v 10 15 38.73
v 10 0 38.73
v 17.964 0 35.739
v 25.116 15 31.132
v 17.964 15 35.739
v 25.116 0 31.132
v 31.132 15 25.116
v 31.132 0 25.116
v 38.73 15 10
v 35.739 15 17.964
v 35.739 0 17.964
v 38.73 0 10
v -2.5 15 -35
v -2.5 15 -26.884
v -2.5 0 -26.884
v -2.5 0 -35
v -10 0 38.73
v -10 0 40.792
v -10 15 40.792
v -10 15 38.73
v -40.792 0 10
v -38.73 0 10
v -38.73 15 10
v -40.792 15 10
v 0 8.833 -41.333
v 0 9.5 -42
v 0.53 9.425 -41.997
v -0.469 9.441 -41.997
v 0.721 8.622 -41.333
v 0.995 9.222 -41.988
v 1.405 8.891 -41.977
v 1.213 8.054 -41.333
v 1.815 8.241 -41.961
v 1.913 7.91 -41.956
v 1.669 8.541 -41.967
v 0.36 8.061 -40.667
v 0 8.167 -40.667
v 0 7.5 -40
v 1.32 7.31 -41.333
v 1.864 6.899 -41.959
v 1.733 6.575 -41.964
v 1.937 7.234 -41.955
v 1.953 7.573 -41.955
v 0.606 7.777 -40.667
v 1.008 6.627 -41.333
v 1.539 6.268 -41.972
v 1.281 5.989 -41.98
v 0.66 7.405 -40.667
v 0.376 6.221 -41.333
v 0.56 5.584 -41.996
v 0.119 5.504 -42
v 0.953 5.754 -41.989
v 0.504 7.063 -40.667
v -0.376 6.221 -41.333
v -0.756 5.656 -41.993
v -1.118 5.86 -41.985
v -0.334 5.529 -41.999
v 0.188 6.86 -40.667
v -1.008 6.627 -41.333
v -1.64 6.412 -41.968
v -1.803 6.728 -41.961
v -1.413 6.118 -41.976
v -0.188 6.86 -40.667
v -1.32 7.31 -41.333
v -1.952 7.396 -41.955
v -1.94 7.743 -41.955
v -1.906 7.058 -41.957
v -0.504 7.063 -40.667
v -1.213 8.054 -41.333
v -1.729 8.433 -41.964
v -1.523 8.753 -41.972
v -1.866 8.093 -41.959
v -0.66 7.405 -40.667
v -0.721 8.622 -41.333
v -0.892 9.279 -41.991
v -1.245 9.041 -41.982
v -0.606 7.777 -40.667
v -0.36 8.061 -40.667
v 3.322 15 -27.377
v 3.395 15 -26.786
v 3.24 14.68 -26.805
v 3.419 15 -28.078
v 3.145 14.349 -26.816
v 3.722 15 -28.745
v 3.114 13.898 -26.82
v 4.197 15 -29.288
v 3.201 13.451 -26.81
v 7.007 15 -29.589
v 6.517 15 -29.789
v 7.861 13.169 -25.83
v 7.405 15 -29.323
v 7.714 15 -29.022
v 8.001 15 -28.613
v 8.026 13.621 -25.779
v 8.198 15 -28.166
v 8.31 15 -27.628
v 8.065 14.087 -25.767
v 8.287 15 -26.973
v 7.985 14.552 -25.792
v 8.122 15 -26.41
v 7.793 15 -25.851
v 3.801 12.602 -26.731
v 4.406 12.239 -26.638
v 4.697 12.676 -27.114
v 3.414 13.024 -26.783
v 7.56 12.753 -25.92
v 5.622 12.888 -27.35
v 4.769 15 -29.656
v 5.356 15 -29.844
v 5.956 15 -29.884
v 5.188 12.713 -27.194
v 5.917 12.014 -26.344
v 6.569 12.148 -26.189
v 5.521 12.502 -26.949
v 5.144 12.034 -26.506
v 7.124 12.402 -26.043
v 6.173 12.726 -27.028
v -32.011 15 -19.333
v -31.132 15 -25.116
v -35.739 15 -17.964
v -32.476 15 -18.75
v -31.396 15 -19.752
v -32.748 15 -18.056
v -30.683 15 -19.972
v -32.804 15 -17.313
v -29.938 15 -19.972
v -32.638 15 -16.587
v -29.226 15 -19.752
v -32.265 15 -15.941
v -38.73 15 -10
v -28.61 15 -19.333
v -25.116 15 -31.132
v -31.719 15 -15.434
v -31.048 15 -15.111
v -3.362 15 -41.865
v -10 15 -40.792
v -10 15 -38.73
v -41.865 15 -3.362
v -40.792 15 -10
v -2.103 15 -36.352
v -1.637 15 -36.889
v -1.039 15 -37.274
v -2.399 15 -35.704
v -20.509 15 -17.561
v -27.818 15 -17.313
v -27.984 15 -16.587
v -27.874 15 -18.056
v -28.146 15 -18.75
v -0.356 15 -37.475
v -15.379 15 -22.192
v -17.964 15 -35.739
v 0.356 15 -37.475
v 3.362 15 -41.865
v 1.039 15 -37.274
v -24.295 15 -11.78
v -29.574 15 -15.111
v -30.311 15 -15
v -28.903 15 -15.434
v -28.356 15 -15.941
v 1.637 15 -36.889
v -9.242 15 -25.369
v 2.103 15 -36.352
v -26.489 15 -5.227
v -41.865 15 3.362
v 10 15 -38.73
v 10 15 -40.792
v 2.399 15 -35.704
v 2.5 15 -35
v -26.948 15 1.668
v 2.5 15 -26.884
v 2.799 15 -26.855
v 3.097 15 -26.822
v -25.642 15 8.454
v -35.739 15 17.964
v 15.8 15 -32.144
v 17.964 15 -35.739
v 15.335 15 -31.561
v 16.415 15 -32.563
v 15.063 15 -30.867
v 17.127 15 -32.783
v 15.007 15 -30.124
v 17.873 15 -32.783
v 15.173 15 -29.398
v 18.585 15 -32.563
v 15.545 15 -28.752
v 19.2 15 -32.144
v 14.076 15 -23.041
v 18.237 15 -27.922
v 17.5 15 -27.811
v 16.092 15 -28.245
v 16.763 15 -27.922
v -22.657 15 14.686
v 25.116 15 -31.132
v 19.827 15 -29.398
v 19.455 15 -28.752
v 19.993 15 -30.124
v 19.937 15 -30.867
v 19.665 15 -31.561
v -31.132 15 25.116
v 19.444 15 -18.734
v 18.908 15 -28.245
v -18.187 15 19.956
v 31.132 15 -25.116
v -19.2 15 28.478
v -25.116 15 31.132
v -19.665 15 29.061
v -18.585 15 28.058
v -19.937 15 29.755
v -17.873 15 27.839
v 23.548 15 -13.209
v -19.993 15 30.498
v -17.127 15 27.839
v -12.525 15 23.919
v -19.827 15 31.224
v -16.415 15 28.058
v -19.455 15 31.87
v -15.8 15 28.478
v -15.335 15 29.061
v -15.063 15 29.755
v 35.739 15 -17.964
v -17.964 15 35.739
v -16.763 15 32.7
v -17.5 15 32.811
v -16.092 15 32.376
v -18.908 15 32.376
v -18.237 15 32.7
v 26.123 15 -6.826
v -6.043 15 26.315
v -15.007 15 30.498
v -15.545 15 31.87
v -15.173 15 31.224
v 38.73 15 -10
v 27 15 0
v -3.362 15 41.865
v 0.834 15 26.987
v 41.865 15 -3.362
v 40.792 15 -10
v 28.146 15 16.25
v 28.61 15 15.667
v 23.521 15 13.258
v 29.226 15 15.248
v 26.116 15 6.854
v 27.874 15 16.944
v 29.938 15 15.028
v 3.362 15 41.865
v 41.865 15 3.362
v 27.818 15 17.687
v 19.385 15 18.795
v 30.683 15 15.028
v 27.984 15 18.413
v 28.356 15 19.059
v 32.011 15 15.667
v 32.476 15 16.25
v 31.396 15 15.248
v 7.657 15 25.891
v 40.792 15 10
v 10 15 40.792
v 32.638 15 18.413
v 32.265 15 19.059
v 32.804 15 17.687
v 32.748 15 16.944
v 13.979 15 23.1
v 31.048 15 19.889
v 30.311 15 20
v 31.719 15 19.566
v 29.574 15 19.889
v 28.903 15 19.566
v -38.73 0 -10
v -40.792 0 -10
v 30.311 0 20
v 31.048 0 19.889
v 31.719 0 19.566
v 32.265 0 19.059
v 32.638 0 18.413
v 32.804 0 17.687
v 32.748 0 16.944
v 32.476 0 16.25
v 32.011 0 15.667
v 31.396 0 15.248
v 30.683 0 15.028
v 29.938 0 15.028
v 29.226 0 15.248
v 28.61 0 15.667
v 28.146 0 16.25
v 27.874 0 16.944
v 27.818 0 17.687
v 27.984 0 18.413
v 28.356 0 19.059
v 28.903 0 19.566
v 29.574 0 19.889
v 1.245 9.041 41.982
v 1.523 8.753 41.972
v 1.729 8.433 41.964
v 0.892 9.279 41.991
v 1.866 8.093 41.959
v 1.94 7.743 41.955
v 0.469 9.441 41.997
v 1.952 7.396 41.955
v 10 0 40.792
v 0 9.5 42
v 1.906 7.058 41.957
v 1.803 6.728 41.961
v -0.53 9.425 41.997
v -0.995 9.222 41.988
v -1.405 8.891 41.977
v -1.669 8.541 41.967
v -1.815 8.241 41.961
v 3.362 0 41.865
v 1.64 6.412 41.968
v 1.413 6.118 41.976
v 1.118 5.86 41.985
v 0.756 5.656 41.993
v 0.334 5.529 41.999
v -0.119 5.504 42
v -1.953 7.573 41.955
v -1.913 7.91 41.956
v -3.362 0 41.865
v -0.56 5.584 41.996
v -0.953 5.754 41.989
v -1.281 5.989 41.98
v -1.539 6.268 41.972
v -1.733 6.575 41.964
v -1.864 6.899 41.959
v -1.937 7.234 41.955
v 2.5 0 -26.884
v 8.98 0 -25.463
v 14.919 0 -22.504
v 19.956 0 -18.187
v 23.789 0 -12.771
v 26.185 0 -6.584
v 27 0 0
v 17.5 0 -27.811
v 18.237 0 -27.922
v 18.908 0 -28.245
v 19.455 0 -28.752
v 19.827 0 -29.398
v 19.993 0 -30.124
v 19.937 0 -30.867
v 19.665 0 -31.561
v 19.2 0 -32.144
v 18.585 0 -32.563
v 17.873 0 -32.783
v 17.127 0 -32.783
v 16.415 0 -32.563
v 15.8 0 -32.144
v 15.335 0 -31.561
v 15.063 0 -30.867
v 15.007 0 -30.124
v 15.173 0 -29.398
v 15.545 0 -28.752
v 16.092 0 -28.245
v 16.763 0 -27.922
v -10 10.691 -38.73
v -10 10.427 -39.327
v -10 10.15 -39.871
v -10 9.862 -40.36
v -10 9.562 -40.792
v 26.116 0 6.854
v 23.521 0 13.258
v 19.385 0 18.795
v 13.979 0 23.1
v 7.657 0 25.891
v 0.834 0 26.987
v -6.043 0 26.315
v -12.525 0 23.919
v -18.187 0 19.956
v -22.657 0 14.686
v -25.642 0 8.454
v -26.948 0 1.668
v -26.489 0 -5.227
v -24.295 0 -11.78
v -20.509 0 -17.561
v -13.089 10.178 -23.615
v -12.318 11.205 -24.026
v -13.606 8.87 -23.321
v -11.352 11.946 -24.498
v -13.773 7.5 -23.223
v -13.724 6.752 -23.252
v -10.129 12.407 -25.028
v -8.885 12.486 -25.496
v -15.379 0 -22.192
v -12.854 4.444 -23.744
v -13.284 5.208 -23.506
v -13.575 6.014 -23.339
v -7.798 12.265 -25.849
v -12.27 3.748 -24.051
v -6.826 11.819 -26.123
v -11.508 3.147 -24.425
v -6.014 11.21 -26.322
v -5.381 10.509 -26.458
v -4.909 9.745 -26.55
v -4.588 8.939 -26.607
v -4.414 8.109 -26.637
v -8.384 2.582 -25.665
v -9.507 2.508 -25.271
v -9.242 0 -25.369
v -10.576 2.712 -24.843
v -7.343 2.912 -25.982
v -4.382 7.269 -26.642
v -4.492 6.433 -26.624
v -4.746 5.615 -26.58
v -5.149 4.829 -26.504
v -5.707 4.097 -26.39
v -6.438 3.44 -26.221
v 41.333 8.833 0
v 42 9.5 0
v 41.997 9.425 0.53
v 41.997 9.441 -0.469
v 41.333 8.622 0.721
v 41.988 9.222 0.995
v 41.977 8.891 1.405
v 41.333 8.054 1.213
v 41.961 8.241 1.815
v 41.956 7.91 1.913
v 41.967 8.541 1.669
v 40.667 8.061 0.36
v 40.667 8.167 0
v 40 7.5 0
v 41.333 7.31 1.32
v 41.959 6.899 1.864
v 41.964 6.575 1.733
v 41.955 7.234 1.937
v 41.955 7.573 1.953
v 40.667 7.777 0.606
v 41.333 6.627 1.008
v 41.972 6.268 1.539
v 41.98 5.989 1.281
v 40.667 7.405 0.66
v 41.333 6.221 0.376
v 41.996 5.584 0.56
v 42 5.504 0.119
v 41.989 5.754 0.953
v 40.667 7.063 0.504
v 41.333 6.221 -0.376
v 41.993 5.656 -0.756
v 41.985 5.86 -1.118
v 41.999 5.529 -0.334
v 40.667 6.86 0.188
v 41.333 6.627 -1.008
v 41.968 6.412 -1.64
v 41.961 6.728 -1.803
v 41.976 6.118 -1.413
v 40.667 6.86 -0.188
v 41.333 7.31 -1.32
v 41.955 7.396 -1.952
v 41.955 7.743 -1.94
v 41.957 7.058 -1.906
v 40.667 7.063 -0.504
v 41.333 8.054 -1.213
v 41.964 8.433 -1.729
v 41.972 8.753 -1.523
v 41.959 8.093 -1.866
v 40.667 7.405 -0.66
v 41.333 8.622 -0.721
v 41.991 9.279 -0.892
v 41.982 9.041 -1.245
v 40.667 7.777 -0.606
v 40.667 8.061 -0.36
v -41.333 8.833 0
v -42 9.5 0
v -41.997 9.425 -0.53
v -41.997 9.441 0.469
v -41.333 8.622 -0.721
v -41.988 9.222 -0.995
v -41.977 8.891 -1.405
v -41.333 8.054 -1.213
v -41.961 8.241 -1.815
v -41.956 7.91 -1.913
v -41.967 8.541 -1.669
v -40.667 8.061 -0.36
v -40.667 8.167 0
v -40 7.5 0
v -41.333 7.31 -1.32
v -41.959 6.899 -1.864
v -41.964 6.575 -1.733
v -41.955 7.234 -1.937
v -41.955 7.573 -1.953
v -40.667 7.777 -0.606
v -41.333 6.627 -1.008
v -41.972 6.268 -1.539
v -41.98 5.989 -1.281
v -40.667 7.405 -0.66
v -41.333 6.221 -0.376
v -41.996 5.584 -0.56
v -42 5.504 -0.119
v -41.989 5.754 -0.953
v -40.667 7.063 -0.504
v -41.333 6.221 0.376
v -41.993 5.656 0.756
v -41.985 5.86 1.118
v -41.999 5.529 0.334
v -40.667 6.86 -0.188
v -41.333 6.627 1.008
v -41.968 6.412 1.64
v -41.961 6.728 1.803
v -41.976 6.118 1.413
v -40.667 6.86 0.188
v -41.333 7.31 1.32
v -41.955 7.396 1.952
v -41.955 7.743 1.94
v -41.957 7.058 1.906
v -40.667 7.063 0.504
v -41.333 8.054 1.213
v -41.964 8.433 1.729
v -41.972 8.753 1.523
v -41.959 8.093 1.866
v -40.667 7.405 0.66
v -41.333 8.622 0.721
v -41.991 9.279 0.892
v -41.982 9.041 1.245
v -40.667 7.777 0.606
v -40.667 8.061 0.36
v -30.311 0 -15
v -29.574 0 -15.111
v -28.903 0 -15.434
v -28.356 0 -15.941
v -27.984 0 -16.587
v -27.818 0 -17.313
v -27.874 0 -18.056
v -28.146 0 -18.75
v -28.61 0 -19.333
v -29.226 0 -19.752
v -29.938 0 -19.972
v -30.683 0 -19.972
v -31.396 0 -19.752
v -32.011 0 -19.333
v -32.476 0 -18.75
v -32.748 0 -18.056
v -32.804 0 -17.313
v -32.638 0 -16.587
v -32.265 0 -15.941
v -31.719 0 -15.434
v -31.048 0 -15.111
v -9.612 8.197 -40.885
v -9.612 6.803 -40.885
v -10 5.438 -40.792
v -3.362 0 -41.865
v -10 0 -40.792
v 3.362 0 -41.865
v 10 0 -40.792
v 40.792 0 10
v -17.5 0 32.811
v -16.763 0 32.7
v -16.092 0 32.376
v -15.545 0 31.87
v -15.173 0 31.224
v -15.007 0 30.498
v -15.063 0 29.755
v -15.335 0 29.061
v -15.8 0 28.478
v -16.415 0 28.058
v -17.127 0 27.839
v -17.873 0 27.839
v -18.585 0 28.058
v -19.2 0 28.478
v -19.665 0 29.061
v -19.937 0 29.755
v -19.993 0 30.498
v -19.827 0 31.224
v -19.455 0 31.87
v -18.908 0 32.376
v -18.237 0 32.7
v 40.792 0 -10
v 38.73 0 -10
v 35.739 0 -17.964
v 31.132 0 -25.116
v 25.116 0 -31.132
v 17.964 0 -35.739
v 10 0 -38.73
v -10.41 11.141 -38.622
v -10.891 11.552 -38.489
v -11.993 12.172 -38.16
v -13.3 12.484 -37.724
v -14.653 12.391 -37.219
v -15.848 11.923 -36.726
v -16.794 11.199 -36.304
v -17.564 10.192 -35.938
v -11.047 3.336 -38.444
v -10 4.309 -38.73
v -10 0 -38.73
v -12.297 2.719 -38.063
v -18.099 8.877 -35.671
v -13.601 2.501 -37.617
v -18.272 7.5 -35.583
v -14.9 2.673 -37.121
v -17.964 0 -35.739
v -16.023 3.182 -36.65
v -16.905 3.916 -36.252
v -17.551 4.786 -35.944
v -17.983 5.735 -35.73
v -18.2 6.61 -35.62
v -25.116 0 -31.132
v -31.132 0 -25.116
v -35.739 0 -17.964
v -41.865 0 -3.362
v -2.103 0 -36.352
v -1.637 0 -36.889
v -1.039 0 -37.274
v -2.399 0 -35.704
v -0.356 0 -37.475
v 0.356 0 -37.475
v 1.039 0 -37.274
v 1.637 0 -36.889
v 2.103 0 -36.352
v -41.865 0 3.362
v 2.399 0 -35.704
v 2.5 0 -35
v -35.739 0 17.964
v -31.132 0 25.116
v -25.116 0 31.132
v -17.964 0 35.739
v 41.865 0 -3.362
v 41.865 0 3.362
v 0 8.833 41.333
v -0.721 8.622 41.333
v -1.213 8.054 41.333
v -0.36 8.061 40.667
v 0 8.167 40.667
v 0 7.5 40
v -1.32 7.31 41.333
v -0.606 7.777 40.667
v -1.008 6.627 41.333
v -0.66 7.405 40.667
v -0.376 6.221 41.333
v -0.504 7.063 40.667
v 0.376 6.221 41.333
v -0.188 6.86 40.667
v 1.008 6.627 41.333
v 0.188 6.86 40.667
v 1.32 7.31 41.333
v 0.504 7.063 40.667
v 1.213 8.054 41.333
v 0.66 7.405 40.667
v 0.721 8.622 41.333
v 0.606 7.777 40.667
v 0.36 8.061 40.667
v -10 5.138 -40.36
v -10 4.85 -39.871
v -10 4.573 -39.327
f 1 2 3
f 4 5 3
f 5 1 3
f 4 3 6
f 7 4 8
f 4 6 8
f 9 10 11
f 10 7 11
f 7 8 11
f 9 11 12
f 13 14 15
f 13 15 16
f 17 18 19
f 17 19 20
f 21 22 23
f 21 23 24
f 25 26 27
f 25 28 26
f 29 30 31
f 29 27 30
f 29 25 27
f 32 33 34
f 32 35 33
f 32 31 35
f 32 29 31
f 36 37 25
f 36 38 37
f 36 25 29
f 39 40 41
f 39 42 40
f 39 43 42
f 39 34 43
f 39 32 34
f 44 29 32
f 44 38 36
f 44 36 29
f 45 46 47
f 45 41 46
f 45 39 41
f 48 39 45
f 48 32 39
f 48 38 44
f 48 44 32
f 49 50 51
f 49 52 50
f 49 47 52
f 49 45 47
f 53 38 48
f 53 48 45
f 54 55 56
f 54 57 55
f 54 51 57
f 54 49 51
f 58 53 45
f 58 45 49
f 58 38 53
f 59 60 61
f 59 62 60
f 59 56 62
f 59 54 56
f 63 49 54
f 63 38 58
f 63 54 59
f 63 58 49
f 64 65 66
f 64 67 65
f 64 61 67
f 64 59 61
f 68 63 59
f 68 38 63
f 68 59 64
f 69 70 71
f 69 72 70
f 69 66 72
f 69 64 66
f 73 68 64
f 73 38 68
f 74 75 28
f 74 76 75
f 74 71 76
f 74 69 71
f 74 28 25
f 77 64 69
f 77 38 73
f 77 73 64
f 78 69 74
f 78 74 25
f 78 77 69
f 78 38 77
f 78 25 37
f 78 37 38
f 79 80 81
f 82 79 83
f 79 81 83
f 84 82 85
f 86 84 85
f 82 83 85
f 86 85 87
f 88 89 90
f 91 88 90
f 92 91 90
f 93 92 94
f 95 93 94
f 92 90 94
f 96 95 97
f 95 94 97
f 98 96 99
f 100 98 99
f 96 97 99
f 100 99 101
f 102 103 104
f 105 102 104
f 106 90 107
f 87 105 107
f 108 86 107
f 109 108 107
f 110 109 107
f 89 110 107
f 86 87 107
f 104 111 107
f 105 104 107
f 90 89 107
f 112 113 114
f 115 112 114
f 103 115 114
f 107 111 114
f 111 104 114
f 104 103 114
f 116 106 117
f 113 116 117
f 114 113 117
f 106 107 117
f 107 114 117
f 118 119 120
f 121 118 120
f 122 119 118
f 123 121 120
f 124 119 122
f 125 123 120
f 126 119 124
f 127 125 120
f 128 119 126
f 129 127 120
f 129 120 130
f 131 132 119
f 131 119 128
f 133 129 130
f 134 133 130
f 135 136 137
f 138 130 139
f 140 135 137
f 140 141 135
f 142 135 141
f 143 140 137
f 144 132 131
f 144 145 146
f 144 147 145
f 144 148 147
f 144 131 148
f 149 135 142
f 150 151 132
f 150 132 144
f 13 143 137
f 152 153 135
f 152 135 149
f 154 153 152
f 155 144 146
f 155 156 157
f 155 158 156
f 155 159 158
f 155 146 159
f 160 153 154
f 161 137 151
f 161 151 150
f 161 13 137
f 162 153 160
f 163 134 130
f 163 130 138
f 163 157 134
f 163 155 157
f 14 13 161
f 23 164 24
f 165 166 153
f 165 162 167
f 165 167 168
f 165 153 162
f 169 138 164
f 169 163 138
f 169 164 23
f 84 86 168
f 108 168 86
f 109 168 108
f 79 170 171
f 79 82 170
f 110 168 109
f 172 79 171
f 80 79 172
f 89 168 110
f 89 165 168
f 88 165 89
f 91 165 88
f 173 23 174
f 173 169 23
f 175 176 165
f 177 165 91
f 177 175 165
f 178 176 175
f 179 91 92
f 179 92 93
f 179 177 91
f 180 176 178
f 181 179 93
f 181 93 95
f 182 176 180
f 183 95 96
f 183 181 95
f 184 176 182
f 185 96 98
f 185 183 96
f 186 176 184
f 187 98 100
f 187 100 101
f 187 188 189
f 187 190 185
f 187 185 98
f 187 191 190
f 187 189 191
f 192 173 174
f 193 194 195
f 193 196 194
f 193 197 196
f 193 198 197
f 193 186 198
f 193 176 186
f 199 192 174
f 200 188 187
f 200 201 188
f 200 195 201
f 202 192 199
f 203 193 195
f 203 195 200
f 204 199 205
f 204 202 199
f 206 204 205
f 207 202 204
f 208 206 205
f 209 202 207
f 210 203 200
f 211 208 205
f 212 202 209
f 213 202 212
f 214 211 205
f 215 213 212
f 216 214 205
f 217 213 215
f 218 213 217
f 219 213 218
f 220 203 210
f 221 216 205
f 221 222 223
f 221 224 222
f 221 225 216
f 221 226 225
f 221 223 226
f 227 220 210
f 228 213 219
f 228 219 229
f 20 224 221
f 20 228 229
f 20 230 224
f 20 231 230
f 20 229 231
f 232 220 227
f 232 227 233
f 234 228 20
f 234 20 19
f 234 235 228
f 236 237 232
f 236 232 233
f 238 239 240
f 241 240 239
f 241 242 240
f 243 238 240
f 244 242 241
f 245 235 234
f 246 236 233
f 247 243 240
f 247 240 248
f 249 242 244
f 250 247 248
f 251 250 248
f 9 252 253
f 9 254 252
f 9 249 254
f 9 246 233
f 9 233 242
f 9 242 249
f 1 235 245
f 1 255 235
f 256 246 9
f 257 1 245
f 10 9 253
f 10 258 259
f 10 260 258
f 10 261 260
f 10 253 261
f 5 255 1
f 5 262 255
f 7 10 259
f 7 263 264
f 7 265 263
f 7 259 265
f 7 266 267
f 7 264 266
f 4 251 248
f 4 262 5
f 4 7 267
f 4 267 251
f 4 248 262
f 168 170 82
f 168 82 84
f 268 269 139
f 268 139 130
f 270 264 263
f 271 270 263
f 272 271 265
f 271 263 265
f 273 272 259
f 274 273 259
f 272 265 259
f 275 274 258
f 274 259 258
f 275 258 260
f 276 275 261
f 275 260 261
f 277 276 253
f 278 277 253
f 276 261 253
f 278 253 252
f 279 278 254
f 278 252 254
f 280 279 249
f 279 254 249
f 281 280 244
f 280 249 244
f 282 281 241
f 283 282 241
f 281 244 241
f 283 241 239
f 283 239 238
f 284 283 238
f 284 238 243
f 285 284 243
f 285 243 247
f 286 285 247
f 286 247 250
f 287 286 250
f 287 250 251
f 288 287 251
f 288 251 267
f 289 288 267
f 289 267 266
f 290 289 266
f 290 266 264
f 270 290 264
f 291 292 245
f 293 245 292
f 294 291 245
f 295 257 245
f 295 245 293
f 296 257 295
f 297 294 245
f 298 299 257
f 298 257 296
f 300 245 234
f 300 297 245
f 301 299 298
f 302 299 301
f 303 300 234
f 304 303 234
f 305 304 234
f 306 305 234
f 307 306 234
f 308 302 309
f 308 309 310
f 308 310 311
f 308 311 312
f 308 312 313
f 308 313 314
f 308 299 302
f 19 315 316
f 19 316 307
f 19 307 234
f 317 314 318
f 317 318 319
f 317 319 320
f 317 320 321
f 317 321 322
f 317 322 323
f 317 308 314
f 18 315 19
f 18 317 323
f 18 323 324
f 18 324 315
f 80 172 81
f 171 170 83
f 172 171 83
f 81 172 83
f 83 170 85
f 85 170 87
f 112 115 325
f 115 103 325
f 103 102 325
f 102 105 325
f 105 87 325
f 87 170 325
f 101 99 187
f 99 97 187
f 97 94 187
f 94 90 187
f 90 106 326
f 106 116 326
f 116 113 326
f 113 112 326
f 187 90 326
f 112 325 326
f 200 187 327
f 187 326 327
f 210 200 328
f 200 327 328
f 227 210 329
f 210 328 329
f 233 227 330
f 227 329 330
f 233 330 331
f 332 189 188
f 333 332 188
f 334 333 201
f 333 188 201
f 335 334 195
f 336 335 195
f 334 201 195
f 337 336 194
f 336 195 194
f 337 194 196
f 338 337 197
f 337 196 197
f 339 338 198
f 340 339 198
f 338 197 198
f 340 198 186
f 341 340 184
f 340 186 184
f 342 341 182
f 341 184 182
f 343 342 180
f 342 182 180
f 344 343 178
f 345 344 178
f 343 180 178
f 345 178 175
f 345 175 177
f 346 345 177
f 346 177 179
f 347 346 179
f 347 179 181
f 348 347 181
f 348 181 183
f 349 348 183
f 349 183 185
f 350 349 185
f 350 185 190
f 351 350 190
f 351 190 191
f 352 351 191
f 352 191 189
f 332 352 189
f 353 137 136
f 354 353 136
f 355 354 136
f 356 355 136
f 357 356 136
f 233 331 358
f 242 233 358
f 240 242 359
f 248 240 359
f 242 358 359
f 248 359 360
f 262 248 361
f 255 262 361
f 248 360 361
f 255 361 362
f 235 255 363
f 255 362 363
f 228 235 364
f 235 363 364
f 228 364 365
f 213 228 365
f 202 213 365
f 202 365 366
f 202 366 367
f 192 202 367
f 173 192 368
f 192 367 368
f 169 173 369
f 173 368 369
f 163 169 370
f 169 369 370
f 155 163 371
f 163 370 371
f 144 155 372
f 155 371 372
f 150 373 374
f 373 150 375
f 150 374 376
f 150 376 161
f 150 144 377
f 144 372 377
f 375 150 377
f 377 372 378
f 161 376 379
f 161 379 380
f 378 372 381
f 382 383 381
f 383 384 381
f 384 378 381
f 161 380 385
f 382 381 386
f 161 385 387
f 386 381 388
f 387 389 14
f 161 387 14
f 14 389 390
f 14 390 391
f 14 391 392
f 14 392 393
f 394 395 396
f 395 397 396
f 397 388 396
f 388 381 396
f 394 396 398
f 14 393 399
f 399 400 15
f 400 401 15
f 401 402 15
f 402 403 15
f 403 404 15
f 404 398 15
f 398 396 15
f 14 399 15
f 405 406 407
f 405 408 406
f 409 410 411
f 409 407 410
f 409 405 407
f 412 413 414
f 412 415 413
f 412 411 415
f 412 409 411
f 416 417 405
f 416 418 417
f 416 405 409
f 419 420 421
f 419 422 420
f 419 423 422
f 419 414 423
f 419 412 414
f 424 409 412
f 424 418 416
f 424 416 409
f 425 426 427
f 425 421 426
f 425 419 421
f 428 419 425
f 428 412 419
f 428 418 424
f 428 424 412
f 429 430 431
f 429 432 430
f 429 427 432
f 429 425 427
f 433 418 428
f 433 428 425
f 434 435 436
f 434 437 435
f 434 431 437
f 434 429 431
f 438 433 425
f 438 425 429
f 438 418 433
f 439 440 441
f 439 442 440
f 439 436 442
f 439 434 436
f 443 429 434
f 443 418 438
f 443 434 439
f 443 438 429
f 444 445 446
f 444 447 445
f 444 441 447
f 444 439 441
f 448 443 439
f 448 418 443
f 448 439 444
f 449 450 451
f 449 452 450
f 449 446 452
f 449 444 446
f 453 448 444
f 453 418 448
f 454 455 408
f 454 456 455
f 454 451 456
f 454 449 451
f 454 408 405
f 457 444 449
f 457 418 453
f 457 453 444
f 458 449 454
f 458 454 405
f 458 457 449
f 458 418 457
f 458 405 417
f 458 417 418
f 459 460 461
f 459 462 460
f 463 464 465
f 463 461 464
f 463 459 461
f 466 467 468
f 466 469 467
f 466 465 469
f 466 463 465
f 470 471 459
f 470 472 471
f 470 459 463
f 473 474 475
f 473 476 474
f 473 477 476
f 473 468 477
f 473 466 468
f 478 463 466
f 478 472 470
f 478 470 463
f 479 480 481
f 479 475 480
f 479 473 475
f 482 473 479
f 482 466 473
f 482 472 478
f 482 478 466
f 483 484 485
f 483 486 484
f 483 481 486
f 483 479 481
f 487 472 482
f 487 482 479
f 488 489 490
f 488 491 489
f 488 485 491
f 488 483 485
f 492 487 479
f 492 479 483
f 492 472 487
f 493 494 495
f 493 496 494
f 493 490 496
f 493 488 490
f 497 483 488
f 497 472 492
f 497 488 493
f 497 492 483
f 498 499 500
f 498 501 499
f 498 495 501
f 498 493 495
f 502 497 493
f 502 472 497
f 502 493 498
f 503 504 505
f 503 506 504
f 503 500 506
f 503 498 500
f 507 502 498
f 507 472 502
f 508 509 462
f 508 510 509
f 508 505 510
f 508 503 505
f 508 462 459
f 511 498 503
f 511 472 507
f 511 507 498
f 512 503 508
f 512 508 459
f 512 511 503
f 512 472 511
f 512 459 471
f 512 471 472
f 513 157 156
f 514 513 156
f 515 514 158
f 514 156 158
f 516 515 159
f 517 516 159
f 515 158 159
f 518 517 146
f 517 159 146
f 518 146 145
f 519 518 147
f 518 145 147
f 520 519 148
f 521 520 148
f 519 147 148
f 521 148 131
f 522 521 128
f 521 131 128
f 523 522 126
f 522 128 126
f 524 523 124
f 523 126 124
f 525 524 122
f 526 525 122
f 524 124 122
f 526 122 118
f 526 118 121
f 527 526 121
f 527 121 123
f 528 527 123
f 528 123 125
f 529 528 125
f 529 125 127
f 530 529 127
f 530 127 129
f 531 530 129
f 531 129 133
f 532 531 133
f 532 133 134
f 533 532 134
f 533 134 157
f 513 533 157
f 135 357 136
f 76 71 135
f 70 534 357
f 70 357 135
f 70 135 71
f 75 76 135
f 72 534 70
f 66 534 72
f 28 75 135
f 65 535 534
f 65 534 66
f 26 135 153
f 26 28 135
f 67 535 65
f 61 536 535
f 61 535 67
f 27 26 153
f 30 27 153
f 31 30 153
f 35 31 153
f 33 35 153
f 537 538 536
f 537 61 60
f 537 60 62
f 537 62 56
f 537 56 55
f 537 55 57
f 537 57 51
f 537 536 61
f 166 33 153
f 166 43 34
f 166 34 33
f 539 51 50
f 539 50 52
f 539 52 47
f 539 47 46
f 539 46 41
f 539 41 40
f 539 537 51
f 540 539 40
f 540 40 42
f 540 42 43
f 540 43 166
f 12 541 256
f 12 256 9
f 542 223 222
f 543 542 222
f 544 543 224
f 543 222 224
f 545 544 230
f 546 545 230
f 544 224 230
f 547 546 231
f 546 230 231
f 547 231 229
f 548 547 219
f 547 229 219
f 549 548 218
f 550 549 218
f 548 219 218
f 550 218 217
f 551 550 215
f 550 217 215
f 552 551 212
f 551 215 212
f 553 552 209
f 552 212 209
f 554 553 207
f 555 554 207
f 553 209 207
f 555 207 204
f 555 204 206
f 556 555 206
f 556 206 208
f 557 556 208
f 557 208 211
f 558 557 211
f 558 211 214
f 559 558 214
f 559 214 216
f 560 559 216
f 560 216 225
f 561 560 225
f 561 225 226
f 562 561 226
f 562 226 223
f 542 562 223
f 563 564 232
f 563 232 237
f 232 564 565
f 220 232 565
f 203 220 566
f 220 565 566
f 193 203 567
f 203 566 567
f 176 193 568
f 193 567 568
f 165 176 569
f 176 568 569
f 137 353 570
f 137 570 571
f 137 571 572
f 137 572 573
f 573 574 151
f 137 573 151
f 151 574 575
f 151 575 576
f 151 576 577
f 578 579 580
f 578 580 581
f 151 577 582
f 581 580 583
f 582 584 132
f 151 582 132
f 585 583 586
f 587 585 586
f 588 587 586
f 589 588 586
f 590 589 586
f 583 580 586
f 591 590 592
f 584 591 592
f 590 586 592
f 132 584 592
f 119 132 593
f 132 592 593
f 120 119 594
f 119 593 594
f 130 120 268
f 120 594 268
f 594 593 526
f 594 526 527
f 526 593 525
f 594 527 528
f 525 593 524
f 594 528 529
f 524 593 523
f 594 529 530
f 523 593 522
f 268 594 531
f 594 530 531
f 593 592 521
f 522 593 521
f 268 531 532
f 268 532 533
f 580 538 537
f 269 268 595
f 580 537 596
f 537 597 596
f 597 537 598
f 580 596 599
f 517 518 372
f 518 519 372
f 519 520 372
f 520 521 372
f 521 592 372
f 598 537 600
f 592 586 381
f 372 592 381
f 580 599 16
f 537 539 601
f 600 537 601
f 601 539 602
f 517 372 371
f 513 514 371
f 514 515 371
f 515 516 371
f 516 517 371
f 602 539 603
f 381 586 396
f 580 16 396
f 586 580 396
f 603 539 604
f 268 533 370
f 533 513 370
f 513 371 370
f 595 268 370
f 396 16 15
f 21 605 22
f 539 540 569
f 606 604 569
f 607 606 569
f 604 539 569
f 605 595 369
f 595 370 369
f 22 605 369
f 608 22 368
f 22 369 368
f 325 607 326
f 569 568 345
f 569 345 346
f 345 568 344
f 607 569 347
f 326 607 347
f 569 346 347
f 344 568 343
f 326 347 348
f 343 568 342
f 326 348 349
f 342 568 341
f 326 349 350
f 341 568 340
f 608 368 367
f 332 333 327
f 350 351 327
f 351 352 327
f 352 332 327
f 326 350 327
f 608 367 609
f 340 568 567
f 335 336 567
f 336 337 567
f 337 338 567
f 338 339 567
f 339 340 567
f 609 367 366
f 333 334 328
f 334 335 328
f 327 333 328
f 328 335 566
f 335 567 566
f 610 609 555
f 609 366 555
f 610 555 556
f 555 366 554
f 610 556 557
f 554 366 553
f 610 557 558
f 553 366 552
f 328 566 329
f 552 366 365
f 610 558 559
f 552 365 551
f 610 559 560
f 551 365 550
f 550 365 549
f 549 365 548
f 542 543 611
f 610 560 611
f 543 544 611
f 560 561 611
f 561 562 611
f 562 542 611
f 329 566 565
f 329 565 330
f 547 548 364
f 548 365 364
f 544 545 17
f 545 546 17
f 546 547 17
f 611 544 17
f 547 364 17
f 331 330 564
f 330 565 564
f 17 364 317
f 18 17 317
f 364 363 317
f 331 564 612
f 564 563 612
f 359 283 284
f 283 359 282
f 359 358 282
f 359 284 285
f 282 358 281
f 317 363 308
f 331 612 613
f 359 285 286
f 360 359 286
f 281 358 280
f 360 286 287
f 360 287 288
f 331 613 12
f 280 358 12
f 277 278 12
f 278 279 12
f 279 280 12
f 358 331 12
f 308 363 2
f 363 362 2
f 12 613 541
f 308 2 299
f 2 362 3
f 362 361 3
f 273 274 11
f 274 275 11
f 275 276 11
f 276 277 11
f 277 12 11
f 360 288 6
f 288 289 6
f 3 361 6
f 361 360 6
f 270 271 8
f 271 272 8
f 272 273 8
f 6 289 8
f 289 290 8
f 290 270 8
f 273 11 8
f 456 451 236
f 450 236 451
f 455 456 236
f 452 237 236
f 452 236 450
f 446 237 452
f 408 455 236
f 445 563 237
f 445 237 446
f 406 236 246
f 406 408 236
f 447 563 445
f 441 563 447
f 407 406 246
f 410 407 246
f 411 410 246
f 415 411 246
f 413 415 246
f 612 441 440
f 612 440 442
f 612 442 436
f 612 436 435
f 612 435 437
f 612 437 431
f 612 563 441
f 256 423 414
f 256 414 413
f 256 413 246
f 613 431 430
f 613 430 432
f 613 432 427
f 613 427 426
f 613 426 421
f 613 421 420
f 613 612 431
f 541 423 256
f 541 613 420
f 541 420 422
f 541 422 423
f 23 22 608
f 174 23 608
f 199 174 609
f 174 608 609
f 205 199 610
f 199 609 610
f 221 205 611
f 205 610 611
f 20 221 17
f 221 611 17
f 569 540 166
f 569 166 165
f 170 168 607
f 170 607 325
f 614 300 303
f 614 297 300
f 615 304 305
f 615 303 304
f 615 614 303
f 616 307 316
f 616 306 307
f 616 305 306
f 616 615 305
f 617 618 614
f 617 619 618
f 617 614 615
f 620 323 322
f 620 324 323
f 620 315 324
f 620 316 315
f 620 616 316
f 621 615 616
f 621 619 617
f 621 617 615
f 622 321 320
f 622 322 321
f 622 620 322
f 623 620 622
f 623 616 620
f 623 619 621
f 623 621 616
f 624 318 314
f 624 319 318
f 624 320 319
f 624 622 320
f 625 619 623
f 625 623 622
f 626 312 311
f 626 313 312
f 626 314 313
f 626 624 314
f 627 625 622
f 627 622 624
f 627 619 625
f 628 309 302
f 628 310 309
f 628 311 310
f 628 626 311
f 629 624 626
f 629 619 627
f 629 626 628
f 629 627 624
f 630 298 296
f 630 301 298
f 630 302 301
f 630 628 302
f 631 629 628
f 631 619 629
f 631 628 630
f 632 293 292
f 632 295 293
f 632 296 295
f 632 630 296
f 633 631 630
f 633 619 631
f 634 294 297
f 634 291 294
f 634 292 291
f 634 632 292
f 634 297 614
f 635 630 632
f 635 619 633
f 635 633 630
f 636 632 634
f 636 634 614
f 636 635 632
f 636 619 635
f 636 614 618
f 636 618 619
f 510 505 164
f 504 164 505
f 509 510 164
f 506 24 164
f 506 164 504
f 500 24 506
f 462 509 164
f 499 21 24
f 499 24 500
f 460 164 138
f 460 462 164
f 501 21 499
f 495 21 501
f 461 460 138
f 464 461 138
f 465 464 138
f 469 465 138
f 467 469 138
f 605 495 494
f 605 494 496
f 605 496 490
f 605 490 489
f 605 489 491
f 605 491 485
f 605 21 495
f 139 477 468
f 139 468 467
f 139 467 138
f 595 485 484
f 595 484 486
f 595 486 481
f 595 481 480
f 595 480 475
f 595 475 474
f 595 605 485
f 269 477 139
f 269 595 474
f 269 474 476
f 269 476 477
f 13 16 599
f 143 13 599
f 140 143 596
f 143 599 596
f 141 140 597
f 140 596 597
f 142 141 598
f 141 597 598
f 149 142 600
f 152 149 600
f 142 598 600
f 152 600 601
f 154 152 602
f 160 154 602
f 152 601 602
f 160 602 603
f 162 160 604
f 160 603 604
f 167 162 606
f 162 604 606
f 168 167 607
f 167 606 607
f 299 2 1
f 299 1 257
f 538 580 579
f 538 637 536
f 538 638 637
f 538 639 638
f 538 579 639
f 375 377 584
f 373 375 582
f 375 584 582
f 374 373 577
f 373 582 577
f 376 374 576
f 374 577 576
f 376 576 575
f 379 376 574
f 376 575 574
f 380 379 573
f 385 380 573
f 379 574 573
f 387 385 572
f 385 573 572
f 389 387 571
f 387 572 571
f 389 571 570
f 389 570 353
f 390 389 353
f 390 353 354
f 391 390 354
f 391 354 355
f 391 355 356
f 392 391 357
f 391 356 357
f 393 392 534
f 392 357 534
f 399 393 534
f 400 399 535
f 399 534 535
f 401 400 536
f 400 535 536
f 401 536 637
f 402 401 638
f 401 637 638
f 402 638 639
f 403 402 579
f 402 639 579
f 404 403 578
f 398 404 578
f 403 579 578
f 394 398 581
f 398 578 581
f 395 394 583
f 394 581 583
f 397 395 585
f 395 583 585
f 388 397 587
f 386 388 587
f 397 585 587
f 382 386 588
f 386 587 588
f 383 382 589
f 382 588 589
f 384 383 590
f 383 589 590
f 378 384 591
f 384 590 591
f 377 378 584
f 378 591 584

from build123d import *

# Parameters (mm, degrees)
SKETCH1_R               = 40
BOSS_EXTRUDE1_DEPTH     = 15
BOSS_EXTRUDE2_DEPTH     = 15
CIRPATTERN1_COUNT       = 4
CUT_EXTRUDE1_REACH      = 102.194
CUT_EXTRUDE1_END_RADIUS = 27
SKETCH3_R               = 5
CUT_EXTRUDE2_REACH      = 63.262
SKETCH7_R               = 2.5
CIRPATTERN2_COUNT       = 4


with BuildPart() as part:
    # Sketch1 → Boss-Extrude1 (new body)
    with BuildSketch(Plane(origin=(0, 0, 0), x_dir=(1, 0, 0), z_dir=(0, 1, 0))):
        with Locations(Location((0, 0, 0), (0, 0, 270))):
            Circle(SKETCH1_R)
        with BuildLine():
            Line((-2.5, 26.884010118), (-2.5, 35))
            ThreePointArc((-2.5, 35), (0, 37.5), (2.5, 35))
            Line((2.5, 35), (2.5, 26.884010118))
            ThreePointArc((2.5, 26.884010118), (19.956202043, 18.186533479), (27, 0))
            ThreePointArc((27, 0), (-18.186533479, -19.956202043), (-2.5, 26.884010118))
        make_face(mode=Mode.SUBTRACT)
    extrude(amount=BOSS_EXTRUDE1_DEPTH)

    # Sketch2 → Boss-Extrude2 (add)
    with BuildSketch(Plane(origin=(0, 0, 0), x_dir=(1, 0, 0), z_dir=(0, 1, 0))):
        with BuildLine():
            Line((-10, 38.729833462), (-10, 40.792156109))
            ThreePointArc((-10, 40.792156109), (0, 42), (10, 40.792156109))
            Line((10, 40.792156109), (10, 38.729833462))
            ThreePointArc((10, 38.729833462), (0, 40), (-10, 38.729833462))
        make_face()
    boss_extrude2 = extrude(amount=BOSS_EXTRUDE2_DEPTH)

    # CirPattern1: Boss-Extrude2 ×4 about axis
    cirpattern1_axis = Axis((0, 0, 0), (0, 1, 0))
    for i in range(1, CIRPATTERN1_COUNT):
        add(boss_extrude2.rotate(cirpattern1_axis, i * 360 / CIRPATTERN1_COUNT))

    # Cut-Extrude1: up to this cylinder (the profile starts outside it)
    cut_extrude1_end = Plane(origin=(0, 7.5, 0), z_dir=(0, -1, 0)) * Cylinder(CUT_EXTRUDE1_END_RADIUS, 259.388, mode=Mode.PRIVATE)
    # Sketch3 → Cut-Extrude1 (cut, up to the surface)
    with BuildSketch(Plane(origin=(-14.36484602, 0, -39.467090073), x_dir=(0, -1, 0), z_dir=(-0.34202014332566616, 0, -0.9396926207859094)), mode=Mode.PRIVATE) as cut_extrude1_sk1:
        with Locations(Location((-7.5, 0, 0), (0, 0, 90))):
            Circle(SKETCH3_R)
    cut_extrude1_tool1 = extrude(cut_extrude1_sk1.sketch, amount=-CUT_EXTRUDE1_REACH, mode=Mode.PRIVATE) - cut_extrude1_end
    add(cut_extrude1_tool1.solids().sort_by_distance((-14.364846, 7.5, -39.46709))[0], mode=Mode.SUBTRACT)

    # Cut-Loft1: read off the stored shape, not the designer's step
    # Cut-Loft1: loft between two sections, ruled curve by curve
    cut_loft1_from = [
        Edge.make_bspline([(3.514240275, 15, -26.425622361), (3.43403107, 15, -26.617896283), (3.366678926, 15, -26.845149984), (3.307378731, 15, -27.375176333), (3.316276229, 15, -27.679385236), (3.439149004, 15, -28.164052423), (3.499144635, 15, -28.33030076), (3.660731431, 15, -28.657904123), (3.762322597, 15, -28.819259148), (4.01061992, 15, -29.122797357), (4.156634299, 15, -29.264354751), (4.484735709, 15, -29.510646827), (4.666742961, 15, -29.615210684), (5.051290806, 15, -29.775629094), (5.253649364, 15, -29.831407709), (5.659510988, 15, -29.891296475), (5.862836528, 15, -29.895470114), (6.253234588, 15, -29.858370786), (6.439375692, 15, -29.817046477), (6.785871072, 15, -29.701395244), (6.946225348, 15, -29.627068321), (7.37710147, 15, -29.373403645), (7.599547955, 15, -29.165702458), (7.934492045, 15, -28.750664024), (8.048605206, 15, -28.542917202), (8.209023616, 15, -28.158369358), (8.27637576, 15, -27.931115657), (8.335675954, 15, -27.401089308), (8.326778456, 15, -27.096880405), (8.203905682, 15, -26.612213219), (8.143910051, 15, -26.445964881), (7.982323255, 15, -26.118361518), (7.880732089, 15, -25.957006493), (7.632434766, 15, -25.653468284), (7.486420387, 15, -25.51191089), (7.158318977, 15, -25.265618814), (6.976311725, 15, -25.161054957), (6.59176388, 15, -25.000636547), (6.389405322, 15, -24.944857932), (5.983543698, 15, -24.884969166), (5.780218158, 15, -24.880795527), (5.389820098, 15, -24.917894855), (5.203678994, 15, -24.959219164), (4.857183614, 15, -25.074870397), (4.696829338, 15, -25.14919732), (4.265953216, 15, -25.402861996), (4.043506731, 15, -25.610563184), (3.708562641, 15, -26.025601617), (3.59444948, 15, -26.233348439), (3.514240275, 15, -26.425622361)], [0, 0, 0, 0, 0.0625, 0.0625, 0.125, 0.125, 0.15625, 0.15625, 0.1875, 0.1875, 0.21875, 0.21875, 0.25, 0.25, 0.28125, 0.28125, 0.3125, 0.3125, 0.34375, 0.34375, 0.375, 0.375, 0.4375, 0.4375, 0.5, 0.5, 0.5625, 0.5625, 0.625, 0.625, 0.65625, 0.65625, 0.6875, 0.6875, 0.71875, 0.71875, 0.75, 0.75, 0.78125, 0.78125, 0.8125, 0.8125, 0.84375, 0.84375, 0.875, 0.875, 0.9375, 0.9375, 1, 1, 1, 1], 3),
    ]
    cut_loft1_to = [
        Edge.make_bspline([(2.074985381, 12, -24.185039409), (2.13411013, 12, -24.427947342), (2.230529651, 12, -24.695535226), (2.549951041, 12, -25.250125143), (2.77479132, 12, -25.537914734), (3.238098263, 12, -25.919158327), (3.413256539, 12, -26.037240227), (3.802322838, 12, -26.239189581), (4.016282358, 12, -26.322904324), (4.47210154, 12, -26.439875089), (4.713892566, 12, -26.472945015), (5.206175894, 12, -26.477842878), (5.456469637, 12, -26.449562366), (5.942285504, 12, -26.331312867), (6.177577655, 12, -26.241399857), (6.612541462, 12, -26.010806383), (6.812086613, 12, -25.870313491), (7.163158835, 12, -25.556942174), (7.314710473, 12, -25.384260574), (7.567442578, 12, -25.026094956), (7.668738965, 12, -24.840722901), (7.90500687, 12, -24.28920003), (7.972433417, 12, -23.93027154), (8.001244839, 12, -23.290920383), (7.963900528, 12, -23.00895336), (7.845651029, 12, -22.523137493), (7.749231508, 12, -22.255549609), (7.429810118, 12, -21.700959692), (7.204969839, 12, -21.413170101), (6.741662897, 12, -21.031926508), (6.56650462, 12, -20.913844608), (6.177438321, 12, -20.711895254), (5.963478802, 12, -20.628180512), (5.507659619, 12, -20.511209746), (5.265868593, 12, -20.47813982), (4.773585266, 12, -20.473241957), (4.523291522, 12, -20.50152247), (4.037475655, 12, -20.619771968), (3.802183505, 12, -20.709684978), (3.367219697, 12, -20.940278452), (3.167674546, 12, -21.080771344), (2.816602324, 12, -21.394142661), (2.665050687, 12, -21.566824261), (2.412318581, 12, -21.924989879), (2.311022194, 12, -22.110361934), (2.074754289, 12, -22.661884805), (2.007327743, 12, -23.020813295), (1.97851632, 12, -23.660164452), (2.015860632, 12, -23.942131475), (2.074985381, 12, -24.185039409)], [0, 0, 0, 0, 0.0625, 0.0625, 0.125, 0.125, 0.15625, 0.15625, 0.1875, 0.1875, 0.21875, 0.21875, 0.25, 0.25, 0.28125, 0.28125, 0.3125, 0.3125, 0.34375, 0.34375, 0.375, 0.375, 0.4375, 0.4375, 0.5, 0.5, 0.5625, 0.5625, 0.625, 0.625, 0.65625, 0.65625, 0.6875, 0.6875, 0.71875, 0.71875, 0.75, 0.75, 0.78125, 0.78125, 0.8125, 0.8125, 0.84375, 0.84375, 0.875, 0.875, 0.9375, 0.9375, 1, 1, 1, 1], 3),
    ]
    cut_loft1 = Solid(Shell([*[Face.make_surface_from_curves(cut_loft1_from[k], cut_loft1_to[k]) for k in range(1)], Face(Wire(cut_loft1_from)), Face(Wire(cut_loft1_to))]))
    add(cut_loft1, mode=Mode.SUBTRACT)

    # Sketch7 → Cut-Extrude2 (cut, up to next)
    with BuildSketch(Plane(origin=(0, 15, 0), x_dir=(1, 0, 0), z_dir=(0, 1, 0)), mode=Mode.PRIVATE) as cut_extrude2_sk1:
        with Locations(Location((17.5, 30.310889132, 0), (0, 0, 270))):
            Circle(SKETCH7_R)
    cut_extrude2_tool1 = extrude(cut_extrude2_sk1.sketch, amount=-CUT_EXTRUDE2_REACH, mode=Mode.PRIVATE) & part.part
    # Sketch7 → Cut-Extrude2 (cut, up to next)
    with BuildSketch(Plane(origin=(0, 15, 0), x_dir=(1, 0, 0), z_dir=(0, 1, 0)), mode=Mode.PRIVATE) as cut_extrude2_sk2:
        with Locations(Location((30.310889132, -17.5, 0), (0, 0, 270))):
            Circle(SKETCH7_R)
    cut_extrude2_tool2 = extrude(cut_extrude2_sk2.sketch, amount=-CUT_EXTRUDE2_REACH, mode=Mode.PRIVATE) & part.part
    # Sketch7 → Cut-Extrude2 (cut, up to next)
    with BuildSketch(Plane(origin=(0, 15, 0), x_dir=(1, 0, 0), z_dir=(0, 1, 0)), mode=Mode.PRIVATE) as cut_extrude2_sk3:
        with Locations(Location((-17.5, -30.310889132, 0), (0, 0, 270))):
            Circle(SKETCH7_R)
    cut_extrude2_tool3 = extrude(cut_extrude2_sk3.sketch, amount=-CUT_EXTRUDE2_REACH, mode=Mode.PRIVATE) & part.part
    # Sketch7 → Cut-Extrude2 (cut, up to next)
    with BuildSketch(Plane(origin=(0, 15, 0), x_dir=(1, 0, 0), z_dir=(0, 1, 0)), mode=Mode.PRIVATE) as cut_extrude2_sk4:
        with Locations(Location((-30.310889132, 17.5, 0), (0, 0, 270))):
            Circle(SKETCH7_R)
    cut_extrude2_tool4 = extrude(cut_extrude2_sk4.sketch, amount=-CUT_EXTRUDE2_REACH, mode=Mode.PRIVATE) & part.part
    add(cut_extrude2_tool1.solids().sort_by_distance((17.5, 15, -30.310889))[0], mode=Mode.SUBTRACT)
    add(cut_extrude2_tool2.solids().sort_by_distance((30.310889, 15, 17.5))[0], mode=Mode.SUBTRACT)
    add(cut_extrude2_tool3.solids().sort_by_distance((-17.5, 15, 30.310889))[0], mode=Mode.SUBTRACT)
    add(cut_extrude2_tool4.solids().sort_by_distance((-30.310889, 15, -17.5))[0], mode=Mode.SUBTRACT)

    # Sketch9 → Cut-Revolve4 (revolve, cut)
    with BuildSketch(Plane(origin=(0, 0, 0), x_dir=(0, 0, -1), z_dir=(1, 0, 0)), mode=Mode.PRIVATE) as cut_revolve4_sk:
        Polygon((42, 7.5), (42, 5.5), (40, 7.5), align=None)
    cut_revolve4 = revolve(cut_revolve4_sk.sketch.rotate(Axis((0, 7.5, -40), (0, 0, -1)), 180), axis=Axis((0, 7.5, -40), (0, 0, -1)), mode=Mode.SUBTRACT)

    # CirPattern2: Cut-Revolve4 ×4 about axis
    cirpattern2_axis = Axis((0, 15, 0), (0, -1, 0))
    for i in range(1, CIRPATTERN2_COUNT):
        add(cut_revolve4.rotate(cirpattern2_axis, i * 360 / CIRPATTERN2_COUNT), mode=Mode.SUBTRACT)


solid = part.part
